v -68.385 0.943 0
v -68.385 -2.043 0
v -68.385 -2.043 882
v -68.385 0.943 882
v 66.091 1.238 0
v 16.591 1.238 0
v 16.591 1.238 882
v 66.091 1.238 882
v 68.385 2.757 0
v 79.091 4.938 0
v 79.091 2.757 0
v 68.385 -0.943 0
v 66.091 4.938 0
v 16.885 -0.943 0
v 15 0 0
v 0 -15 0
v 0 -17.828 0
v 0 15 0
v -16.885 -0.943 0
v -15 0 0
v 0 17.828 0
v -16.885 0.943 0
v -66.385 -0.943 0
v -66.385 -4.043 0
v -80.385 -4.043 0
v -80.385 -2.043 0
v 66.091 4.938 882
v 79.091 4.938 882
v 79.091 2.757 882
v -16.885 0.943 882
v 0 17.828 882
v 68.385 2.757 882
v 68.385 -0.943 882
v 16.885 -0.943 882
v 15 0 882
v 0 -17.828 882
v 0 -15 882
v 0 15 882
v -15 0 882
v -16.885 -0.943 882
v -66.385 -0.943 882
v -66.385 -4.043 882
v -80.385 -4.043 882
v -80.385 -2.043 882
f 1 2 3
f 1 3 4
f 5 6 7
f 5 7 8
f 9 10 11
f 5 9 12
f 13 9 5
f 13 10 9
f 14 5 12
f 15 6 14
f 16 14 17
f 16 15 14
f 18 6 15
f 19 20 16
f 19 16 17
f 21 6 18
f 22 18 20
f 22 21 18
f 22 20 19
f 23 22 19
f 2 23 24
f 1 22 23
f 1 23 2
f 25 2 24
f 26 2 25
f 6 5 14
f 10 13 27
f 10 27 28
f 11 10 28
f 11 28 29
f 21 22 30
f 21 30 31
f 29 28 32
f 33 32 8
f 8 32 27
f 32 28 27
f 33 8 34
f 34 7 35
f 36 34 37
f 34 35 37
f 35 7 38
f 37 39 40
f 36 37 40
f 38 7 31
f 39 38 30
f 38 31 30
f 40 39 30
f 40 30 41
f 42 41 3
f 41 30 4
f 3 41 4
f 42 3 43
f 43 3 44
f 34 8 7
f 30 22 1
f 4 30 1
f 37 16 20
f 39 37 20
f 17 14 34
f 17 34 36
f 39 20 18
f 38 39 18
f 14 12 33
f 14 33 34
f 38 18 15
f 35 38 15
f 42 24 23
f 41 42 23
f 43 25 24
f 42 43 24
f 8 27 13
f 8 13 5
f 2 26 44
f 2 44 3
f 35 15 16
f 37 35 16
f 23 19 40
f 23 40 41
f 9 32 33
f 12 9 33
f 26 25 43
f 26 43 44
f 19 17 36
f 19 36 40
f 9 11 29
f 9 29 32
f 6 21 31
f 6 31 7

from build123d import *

# Parameters (mm, degrees)
BOSS_EXTRUDE1_DEPTH = 882


with BuildPart() as part:
    # Sketch1 → Boss-Extrude1 (new body)
    with BuildSketch(Plane.XY):
        Polygon((-66.385092096, 0.943335029), (-16.885092096, 0.943335029), (0, 17.828427125), (16.590763052, 1.237664072), (66.090763052, 1.237664072), (66.090763052, 2.937664072), (66.090763052, 4.937664072), (79.090763052, 4.937664072), (79.090763052, 2.756664971), (68.385092096, 2.756664971), (68.385092096, -0.943335029), (16.885092096, -0.943335029), (0, -17.828427125), (-16.885092096, -0.943335029), (-66.385092096, -0.943335029), (-66.385092096, -2.043335029), (-66.385092096, -4.043335029), (-68.385092096, -4.043335029), (-80.385092096, -4.043335029), (-80.385092096, -2.043335029), (-68.385092096, -2.043335029), (-68.385092096, 0.943335029), align=None)
        Polygon((-15, 0), (0, 15), (15, 0), (0, -15), align=None, mode=Mode.SUBTRACT)
    extrude(amount=BOSS_EXTRUDE1_DEPTH)


solid = part.part
